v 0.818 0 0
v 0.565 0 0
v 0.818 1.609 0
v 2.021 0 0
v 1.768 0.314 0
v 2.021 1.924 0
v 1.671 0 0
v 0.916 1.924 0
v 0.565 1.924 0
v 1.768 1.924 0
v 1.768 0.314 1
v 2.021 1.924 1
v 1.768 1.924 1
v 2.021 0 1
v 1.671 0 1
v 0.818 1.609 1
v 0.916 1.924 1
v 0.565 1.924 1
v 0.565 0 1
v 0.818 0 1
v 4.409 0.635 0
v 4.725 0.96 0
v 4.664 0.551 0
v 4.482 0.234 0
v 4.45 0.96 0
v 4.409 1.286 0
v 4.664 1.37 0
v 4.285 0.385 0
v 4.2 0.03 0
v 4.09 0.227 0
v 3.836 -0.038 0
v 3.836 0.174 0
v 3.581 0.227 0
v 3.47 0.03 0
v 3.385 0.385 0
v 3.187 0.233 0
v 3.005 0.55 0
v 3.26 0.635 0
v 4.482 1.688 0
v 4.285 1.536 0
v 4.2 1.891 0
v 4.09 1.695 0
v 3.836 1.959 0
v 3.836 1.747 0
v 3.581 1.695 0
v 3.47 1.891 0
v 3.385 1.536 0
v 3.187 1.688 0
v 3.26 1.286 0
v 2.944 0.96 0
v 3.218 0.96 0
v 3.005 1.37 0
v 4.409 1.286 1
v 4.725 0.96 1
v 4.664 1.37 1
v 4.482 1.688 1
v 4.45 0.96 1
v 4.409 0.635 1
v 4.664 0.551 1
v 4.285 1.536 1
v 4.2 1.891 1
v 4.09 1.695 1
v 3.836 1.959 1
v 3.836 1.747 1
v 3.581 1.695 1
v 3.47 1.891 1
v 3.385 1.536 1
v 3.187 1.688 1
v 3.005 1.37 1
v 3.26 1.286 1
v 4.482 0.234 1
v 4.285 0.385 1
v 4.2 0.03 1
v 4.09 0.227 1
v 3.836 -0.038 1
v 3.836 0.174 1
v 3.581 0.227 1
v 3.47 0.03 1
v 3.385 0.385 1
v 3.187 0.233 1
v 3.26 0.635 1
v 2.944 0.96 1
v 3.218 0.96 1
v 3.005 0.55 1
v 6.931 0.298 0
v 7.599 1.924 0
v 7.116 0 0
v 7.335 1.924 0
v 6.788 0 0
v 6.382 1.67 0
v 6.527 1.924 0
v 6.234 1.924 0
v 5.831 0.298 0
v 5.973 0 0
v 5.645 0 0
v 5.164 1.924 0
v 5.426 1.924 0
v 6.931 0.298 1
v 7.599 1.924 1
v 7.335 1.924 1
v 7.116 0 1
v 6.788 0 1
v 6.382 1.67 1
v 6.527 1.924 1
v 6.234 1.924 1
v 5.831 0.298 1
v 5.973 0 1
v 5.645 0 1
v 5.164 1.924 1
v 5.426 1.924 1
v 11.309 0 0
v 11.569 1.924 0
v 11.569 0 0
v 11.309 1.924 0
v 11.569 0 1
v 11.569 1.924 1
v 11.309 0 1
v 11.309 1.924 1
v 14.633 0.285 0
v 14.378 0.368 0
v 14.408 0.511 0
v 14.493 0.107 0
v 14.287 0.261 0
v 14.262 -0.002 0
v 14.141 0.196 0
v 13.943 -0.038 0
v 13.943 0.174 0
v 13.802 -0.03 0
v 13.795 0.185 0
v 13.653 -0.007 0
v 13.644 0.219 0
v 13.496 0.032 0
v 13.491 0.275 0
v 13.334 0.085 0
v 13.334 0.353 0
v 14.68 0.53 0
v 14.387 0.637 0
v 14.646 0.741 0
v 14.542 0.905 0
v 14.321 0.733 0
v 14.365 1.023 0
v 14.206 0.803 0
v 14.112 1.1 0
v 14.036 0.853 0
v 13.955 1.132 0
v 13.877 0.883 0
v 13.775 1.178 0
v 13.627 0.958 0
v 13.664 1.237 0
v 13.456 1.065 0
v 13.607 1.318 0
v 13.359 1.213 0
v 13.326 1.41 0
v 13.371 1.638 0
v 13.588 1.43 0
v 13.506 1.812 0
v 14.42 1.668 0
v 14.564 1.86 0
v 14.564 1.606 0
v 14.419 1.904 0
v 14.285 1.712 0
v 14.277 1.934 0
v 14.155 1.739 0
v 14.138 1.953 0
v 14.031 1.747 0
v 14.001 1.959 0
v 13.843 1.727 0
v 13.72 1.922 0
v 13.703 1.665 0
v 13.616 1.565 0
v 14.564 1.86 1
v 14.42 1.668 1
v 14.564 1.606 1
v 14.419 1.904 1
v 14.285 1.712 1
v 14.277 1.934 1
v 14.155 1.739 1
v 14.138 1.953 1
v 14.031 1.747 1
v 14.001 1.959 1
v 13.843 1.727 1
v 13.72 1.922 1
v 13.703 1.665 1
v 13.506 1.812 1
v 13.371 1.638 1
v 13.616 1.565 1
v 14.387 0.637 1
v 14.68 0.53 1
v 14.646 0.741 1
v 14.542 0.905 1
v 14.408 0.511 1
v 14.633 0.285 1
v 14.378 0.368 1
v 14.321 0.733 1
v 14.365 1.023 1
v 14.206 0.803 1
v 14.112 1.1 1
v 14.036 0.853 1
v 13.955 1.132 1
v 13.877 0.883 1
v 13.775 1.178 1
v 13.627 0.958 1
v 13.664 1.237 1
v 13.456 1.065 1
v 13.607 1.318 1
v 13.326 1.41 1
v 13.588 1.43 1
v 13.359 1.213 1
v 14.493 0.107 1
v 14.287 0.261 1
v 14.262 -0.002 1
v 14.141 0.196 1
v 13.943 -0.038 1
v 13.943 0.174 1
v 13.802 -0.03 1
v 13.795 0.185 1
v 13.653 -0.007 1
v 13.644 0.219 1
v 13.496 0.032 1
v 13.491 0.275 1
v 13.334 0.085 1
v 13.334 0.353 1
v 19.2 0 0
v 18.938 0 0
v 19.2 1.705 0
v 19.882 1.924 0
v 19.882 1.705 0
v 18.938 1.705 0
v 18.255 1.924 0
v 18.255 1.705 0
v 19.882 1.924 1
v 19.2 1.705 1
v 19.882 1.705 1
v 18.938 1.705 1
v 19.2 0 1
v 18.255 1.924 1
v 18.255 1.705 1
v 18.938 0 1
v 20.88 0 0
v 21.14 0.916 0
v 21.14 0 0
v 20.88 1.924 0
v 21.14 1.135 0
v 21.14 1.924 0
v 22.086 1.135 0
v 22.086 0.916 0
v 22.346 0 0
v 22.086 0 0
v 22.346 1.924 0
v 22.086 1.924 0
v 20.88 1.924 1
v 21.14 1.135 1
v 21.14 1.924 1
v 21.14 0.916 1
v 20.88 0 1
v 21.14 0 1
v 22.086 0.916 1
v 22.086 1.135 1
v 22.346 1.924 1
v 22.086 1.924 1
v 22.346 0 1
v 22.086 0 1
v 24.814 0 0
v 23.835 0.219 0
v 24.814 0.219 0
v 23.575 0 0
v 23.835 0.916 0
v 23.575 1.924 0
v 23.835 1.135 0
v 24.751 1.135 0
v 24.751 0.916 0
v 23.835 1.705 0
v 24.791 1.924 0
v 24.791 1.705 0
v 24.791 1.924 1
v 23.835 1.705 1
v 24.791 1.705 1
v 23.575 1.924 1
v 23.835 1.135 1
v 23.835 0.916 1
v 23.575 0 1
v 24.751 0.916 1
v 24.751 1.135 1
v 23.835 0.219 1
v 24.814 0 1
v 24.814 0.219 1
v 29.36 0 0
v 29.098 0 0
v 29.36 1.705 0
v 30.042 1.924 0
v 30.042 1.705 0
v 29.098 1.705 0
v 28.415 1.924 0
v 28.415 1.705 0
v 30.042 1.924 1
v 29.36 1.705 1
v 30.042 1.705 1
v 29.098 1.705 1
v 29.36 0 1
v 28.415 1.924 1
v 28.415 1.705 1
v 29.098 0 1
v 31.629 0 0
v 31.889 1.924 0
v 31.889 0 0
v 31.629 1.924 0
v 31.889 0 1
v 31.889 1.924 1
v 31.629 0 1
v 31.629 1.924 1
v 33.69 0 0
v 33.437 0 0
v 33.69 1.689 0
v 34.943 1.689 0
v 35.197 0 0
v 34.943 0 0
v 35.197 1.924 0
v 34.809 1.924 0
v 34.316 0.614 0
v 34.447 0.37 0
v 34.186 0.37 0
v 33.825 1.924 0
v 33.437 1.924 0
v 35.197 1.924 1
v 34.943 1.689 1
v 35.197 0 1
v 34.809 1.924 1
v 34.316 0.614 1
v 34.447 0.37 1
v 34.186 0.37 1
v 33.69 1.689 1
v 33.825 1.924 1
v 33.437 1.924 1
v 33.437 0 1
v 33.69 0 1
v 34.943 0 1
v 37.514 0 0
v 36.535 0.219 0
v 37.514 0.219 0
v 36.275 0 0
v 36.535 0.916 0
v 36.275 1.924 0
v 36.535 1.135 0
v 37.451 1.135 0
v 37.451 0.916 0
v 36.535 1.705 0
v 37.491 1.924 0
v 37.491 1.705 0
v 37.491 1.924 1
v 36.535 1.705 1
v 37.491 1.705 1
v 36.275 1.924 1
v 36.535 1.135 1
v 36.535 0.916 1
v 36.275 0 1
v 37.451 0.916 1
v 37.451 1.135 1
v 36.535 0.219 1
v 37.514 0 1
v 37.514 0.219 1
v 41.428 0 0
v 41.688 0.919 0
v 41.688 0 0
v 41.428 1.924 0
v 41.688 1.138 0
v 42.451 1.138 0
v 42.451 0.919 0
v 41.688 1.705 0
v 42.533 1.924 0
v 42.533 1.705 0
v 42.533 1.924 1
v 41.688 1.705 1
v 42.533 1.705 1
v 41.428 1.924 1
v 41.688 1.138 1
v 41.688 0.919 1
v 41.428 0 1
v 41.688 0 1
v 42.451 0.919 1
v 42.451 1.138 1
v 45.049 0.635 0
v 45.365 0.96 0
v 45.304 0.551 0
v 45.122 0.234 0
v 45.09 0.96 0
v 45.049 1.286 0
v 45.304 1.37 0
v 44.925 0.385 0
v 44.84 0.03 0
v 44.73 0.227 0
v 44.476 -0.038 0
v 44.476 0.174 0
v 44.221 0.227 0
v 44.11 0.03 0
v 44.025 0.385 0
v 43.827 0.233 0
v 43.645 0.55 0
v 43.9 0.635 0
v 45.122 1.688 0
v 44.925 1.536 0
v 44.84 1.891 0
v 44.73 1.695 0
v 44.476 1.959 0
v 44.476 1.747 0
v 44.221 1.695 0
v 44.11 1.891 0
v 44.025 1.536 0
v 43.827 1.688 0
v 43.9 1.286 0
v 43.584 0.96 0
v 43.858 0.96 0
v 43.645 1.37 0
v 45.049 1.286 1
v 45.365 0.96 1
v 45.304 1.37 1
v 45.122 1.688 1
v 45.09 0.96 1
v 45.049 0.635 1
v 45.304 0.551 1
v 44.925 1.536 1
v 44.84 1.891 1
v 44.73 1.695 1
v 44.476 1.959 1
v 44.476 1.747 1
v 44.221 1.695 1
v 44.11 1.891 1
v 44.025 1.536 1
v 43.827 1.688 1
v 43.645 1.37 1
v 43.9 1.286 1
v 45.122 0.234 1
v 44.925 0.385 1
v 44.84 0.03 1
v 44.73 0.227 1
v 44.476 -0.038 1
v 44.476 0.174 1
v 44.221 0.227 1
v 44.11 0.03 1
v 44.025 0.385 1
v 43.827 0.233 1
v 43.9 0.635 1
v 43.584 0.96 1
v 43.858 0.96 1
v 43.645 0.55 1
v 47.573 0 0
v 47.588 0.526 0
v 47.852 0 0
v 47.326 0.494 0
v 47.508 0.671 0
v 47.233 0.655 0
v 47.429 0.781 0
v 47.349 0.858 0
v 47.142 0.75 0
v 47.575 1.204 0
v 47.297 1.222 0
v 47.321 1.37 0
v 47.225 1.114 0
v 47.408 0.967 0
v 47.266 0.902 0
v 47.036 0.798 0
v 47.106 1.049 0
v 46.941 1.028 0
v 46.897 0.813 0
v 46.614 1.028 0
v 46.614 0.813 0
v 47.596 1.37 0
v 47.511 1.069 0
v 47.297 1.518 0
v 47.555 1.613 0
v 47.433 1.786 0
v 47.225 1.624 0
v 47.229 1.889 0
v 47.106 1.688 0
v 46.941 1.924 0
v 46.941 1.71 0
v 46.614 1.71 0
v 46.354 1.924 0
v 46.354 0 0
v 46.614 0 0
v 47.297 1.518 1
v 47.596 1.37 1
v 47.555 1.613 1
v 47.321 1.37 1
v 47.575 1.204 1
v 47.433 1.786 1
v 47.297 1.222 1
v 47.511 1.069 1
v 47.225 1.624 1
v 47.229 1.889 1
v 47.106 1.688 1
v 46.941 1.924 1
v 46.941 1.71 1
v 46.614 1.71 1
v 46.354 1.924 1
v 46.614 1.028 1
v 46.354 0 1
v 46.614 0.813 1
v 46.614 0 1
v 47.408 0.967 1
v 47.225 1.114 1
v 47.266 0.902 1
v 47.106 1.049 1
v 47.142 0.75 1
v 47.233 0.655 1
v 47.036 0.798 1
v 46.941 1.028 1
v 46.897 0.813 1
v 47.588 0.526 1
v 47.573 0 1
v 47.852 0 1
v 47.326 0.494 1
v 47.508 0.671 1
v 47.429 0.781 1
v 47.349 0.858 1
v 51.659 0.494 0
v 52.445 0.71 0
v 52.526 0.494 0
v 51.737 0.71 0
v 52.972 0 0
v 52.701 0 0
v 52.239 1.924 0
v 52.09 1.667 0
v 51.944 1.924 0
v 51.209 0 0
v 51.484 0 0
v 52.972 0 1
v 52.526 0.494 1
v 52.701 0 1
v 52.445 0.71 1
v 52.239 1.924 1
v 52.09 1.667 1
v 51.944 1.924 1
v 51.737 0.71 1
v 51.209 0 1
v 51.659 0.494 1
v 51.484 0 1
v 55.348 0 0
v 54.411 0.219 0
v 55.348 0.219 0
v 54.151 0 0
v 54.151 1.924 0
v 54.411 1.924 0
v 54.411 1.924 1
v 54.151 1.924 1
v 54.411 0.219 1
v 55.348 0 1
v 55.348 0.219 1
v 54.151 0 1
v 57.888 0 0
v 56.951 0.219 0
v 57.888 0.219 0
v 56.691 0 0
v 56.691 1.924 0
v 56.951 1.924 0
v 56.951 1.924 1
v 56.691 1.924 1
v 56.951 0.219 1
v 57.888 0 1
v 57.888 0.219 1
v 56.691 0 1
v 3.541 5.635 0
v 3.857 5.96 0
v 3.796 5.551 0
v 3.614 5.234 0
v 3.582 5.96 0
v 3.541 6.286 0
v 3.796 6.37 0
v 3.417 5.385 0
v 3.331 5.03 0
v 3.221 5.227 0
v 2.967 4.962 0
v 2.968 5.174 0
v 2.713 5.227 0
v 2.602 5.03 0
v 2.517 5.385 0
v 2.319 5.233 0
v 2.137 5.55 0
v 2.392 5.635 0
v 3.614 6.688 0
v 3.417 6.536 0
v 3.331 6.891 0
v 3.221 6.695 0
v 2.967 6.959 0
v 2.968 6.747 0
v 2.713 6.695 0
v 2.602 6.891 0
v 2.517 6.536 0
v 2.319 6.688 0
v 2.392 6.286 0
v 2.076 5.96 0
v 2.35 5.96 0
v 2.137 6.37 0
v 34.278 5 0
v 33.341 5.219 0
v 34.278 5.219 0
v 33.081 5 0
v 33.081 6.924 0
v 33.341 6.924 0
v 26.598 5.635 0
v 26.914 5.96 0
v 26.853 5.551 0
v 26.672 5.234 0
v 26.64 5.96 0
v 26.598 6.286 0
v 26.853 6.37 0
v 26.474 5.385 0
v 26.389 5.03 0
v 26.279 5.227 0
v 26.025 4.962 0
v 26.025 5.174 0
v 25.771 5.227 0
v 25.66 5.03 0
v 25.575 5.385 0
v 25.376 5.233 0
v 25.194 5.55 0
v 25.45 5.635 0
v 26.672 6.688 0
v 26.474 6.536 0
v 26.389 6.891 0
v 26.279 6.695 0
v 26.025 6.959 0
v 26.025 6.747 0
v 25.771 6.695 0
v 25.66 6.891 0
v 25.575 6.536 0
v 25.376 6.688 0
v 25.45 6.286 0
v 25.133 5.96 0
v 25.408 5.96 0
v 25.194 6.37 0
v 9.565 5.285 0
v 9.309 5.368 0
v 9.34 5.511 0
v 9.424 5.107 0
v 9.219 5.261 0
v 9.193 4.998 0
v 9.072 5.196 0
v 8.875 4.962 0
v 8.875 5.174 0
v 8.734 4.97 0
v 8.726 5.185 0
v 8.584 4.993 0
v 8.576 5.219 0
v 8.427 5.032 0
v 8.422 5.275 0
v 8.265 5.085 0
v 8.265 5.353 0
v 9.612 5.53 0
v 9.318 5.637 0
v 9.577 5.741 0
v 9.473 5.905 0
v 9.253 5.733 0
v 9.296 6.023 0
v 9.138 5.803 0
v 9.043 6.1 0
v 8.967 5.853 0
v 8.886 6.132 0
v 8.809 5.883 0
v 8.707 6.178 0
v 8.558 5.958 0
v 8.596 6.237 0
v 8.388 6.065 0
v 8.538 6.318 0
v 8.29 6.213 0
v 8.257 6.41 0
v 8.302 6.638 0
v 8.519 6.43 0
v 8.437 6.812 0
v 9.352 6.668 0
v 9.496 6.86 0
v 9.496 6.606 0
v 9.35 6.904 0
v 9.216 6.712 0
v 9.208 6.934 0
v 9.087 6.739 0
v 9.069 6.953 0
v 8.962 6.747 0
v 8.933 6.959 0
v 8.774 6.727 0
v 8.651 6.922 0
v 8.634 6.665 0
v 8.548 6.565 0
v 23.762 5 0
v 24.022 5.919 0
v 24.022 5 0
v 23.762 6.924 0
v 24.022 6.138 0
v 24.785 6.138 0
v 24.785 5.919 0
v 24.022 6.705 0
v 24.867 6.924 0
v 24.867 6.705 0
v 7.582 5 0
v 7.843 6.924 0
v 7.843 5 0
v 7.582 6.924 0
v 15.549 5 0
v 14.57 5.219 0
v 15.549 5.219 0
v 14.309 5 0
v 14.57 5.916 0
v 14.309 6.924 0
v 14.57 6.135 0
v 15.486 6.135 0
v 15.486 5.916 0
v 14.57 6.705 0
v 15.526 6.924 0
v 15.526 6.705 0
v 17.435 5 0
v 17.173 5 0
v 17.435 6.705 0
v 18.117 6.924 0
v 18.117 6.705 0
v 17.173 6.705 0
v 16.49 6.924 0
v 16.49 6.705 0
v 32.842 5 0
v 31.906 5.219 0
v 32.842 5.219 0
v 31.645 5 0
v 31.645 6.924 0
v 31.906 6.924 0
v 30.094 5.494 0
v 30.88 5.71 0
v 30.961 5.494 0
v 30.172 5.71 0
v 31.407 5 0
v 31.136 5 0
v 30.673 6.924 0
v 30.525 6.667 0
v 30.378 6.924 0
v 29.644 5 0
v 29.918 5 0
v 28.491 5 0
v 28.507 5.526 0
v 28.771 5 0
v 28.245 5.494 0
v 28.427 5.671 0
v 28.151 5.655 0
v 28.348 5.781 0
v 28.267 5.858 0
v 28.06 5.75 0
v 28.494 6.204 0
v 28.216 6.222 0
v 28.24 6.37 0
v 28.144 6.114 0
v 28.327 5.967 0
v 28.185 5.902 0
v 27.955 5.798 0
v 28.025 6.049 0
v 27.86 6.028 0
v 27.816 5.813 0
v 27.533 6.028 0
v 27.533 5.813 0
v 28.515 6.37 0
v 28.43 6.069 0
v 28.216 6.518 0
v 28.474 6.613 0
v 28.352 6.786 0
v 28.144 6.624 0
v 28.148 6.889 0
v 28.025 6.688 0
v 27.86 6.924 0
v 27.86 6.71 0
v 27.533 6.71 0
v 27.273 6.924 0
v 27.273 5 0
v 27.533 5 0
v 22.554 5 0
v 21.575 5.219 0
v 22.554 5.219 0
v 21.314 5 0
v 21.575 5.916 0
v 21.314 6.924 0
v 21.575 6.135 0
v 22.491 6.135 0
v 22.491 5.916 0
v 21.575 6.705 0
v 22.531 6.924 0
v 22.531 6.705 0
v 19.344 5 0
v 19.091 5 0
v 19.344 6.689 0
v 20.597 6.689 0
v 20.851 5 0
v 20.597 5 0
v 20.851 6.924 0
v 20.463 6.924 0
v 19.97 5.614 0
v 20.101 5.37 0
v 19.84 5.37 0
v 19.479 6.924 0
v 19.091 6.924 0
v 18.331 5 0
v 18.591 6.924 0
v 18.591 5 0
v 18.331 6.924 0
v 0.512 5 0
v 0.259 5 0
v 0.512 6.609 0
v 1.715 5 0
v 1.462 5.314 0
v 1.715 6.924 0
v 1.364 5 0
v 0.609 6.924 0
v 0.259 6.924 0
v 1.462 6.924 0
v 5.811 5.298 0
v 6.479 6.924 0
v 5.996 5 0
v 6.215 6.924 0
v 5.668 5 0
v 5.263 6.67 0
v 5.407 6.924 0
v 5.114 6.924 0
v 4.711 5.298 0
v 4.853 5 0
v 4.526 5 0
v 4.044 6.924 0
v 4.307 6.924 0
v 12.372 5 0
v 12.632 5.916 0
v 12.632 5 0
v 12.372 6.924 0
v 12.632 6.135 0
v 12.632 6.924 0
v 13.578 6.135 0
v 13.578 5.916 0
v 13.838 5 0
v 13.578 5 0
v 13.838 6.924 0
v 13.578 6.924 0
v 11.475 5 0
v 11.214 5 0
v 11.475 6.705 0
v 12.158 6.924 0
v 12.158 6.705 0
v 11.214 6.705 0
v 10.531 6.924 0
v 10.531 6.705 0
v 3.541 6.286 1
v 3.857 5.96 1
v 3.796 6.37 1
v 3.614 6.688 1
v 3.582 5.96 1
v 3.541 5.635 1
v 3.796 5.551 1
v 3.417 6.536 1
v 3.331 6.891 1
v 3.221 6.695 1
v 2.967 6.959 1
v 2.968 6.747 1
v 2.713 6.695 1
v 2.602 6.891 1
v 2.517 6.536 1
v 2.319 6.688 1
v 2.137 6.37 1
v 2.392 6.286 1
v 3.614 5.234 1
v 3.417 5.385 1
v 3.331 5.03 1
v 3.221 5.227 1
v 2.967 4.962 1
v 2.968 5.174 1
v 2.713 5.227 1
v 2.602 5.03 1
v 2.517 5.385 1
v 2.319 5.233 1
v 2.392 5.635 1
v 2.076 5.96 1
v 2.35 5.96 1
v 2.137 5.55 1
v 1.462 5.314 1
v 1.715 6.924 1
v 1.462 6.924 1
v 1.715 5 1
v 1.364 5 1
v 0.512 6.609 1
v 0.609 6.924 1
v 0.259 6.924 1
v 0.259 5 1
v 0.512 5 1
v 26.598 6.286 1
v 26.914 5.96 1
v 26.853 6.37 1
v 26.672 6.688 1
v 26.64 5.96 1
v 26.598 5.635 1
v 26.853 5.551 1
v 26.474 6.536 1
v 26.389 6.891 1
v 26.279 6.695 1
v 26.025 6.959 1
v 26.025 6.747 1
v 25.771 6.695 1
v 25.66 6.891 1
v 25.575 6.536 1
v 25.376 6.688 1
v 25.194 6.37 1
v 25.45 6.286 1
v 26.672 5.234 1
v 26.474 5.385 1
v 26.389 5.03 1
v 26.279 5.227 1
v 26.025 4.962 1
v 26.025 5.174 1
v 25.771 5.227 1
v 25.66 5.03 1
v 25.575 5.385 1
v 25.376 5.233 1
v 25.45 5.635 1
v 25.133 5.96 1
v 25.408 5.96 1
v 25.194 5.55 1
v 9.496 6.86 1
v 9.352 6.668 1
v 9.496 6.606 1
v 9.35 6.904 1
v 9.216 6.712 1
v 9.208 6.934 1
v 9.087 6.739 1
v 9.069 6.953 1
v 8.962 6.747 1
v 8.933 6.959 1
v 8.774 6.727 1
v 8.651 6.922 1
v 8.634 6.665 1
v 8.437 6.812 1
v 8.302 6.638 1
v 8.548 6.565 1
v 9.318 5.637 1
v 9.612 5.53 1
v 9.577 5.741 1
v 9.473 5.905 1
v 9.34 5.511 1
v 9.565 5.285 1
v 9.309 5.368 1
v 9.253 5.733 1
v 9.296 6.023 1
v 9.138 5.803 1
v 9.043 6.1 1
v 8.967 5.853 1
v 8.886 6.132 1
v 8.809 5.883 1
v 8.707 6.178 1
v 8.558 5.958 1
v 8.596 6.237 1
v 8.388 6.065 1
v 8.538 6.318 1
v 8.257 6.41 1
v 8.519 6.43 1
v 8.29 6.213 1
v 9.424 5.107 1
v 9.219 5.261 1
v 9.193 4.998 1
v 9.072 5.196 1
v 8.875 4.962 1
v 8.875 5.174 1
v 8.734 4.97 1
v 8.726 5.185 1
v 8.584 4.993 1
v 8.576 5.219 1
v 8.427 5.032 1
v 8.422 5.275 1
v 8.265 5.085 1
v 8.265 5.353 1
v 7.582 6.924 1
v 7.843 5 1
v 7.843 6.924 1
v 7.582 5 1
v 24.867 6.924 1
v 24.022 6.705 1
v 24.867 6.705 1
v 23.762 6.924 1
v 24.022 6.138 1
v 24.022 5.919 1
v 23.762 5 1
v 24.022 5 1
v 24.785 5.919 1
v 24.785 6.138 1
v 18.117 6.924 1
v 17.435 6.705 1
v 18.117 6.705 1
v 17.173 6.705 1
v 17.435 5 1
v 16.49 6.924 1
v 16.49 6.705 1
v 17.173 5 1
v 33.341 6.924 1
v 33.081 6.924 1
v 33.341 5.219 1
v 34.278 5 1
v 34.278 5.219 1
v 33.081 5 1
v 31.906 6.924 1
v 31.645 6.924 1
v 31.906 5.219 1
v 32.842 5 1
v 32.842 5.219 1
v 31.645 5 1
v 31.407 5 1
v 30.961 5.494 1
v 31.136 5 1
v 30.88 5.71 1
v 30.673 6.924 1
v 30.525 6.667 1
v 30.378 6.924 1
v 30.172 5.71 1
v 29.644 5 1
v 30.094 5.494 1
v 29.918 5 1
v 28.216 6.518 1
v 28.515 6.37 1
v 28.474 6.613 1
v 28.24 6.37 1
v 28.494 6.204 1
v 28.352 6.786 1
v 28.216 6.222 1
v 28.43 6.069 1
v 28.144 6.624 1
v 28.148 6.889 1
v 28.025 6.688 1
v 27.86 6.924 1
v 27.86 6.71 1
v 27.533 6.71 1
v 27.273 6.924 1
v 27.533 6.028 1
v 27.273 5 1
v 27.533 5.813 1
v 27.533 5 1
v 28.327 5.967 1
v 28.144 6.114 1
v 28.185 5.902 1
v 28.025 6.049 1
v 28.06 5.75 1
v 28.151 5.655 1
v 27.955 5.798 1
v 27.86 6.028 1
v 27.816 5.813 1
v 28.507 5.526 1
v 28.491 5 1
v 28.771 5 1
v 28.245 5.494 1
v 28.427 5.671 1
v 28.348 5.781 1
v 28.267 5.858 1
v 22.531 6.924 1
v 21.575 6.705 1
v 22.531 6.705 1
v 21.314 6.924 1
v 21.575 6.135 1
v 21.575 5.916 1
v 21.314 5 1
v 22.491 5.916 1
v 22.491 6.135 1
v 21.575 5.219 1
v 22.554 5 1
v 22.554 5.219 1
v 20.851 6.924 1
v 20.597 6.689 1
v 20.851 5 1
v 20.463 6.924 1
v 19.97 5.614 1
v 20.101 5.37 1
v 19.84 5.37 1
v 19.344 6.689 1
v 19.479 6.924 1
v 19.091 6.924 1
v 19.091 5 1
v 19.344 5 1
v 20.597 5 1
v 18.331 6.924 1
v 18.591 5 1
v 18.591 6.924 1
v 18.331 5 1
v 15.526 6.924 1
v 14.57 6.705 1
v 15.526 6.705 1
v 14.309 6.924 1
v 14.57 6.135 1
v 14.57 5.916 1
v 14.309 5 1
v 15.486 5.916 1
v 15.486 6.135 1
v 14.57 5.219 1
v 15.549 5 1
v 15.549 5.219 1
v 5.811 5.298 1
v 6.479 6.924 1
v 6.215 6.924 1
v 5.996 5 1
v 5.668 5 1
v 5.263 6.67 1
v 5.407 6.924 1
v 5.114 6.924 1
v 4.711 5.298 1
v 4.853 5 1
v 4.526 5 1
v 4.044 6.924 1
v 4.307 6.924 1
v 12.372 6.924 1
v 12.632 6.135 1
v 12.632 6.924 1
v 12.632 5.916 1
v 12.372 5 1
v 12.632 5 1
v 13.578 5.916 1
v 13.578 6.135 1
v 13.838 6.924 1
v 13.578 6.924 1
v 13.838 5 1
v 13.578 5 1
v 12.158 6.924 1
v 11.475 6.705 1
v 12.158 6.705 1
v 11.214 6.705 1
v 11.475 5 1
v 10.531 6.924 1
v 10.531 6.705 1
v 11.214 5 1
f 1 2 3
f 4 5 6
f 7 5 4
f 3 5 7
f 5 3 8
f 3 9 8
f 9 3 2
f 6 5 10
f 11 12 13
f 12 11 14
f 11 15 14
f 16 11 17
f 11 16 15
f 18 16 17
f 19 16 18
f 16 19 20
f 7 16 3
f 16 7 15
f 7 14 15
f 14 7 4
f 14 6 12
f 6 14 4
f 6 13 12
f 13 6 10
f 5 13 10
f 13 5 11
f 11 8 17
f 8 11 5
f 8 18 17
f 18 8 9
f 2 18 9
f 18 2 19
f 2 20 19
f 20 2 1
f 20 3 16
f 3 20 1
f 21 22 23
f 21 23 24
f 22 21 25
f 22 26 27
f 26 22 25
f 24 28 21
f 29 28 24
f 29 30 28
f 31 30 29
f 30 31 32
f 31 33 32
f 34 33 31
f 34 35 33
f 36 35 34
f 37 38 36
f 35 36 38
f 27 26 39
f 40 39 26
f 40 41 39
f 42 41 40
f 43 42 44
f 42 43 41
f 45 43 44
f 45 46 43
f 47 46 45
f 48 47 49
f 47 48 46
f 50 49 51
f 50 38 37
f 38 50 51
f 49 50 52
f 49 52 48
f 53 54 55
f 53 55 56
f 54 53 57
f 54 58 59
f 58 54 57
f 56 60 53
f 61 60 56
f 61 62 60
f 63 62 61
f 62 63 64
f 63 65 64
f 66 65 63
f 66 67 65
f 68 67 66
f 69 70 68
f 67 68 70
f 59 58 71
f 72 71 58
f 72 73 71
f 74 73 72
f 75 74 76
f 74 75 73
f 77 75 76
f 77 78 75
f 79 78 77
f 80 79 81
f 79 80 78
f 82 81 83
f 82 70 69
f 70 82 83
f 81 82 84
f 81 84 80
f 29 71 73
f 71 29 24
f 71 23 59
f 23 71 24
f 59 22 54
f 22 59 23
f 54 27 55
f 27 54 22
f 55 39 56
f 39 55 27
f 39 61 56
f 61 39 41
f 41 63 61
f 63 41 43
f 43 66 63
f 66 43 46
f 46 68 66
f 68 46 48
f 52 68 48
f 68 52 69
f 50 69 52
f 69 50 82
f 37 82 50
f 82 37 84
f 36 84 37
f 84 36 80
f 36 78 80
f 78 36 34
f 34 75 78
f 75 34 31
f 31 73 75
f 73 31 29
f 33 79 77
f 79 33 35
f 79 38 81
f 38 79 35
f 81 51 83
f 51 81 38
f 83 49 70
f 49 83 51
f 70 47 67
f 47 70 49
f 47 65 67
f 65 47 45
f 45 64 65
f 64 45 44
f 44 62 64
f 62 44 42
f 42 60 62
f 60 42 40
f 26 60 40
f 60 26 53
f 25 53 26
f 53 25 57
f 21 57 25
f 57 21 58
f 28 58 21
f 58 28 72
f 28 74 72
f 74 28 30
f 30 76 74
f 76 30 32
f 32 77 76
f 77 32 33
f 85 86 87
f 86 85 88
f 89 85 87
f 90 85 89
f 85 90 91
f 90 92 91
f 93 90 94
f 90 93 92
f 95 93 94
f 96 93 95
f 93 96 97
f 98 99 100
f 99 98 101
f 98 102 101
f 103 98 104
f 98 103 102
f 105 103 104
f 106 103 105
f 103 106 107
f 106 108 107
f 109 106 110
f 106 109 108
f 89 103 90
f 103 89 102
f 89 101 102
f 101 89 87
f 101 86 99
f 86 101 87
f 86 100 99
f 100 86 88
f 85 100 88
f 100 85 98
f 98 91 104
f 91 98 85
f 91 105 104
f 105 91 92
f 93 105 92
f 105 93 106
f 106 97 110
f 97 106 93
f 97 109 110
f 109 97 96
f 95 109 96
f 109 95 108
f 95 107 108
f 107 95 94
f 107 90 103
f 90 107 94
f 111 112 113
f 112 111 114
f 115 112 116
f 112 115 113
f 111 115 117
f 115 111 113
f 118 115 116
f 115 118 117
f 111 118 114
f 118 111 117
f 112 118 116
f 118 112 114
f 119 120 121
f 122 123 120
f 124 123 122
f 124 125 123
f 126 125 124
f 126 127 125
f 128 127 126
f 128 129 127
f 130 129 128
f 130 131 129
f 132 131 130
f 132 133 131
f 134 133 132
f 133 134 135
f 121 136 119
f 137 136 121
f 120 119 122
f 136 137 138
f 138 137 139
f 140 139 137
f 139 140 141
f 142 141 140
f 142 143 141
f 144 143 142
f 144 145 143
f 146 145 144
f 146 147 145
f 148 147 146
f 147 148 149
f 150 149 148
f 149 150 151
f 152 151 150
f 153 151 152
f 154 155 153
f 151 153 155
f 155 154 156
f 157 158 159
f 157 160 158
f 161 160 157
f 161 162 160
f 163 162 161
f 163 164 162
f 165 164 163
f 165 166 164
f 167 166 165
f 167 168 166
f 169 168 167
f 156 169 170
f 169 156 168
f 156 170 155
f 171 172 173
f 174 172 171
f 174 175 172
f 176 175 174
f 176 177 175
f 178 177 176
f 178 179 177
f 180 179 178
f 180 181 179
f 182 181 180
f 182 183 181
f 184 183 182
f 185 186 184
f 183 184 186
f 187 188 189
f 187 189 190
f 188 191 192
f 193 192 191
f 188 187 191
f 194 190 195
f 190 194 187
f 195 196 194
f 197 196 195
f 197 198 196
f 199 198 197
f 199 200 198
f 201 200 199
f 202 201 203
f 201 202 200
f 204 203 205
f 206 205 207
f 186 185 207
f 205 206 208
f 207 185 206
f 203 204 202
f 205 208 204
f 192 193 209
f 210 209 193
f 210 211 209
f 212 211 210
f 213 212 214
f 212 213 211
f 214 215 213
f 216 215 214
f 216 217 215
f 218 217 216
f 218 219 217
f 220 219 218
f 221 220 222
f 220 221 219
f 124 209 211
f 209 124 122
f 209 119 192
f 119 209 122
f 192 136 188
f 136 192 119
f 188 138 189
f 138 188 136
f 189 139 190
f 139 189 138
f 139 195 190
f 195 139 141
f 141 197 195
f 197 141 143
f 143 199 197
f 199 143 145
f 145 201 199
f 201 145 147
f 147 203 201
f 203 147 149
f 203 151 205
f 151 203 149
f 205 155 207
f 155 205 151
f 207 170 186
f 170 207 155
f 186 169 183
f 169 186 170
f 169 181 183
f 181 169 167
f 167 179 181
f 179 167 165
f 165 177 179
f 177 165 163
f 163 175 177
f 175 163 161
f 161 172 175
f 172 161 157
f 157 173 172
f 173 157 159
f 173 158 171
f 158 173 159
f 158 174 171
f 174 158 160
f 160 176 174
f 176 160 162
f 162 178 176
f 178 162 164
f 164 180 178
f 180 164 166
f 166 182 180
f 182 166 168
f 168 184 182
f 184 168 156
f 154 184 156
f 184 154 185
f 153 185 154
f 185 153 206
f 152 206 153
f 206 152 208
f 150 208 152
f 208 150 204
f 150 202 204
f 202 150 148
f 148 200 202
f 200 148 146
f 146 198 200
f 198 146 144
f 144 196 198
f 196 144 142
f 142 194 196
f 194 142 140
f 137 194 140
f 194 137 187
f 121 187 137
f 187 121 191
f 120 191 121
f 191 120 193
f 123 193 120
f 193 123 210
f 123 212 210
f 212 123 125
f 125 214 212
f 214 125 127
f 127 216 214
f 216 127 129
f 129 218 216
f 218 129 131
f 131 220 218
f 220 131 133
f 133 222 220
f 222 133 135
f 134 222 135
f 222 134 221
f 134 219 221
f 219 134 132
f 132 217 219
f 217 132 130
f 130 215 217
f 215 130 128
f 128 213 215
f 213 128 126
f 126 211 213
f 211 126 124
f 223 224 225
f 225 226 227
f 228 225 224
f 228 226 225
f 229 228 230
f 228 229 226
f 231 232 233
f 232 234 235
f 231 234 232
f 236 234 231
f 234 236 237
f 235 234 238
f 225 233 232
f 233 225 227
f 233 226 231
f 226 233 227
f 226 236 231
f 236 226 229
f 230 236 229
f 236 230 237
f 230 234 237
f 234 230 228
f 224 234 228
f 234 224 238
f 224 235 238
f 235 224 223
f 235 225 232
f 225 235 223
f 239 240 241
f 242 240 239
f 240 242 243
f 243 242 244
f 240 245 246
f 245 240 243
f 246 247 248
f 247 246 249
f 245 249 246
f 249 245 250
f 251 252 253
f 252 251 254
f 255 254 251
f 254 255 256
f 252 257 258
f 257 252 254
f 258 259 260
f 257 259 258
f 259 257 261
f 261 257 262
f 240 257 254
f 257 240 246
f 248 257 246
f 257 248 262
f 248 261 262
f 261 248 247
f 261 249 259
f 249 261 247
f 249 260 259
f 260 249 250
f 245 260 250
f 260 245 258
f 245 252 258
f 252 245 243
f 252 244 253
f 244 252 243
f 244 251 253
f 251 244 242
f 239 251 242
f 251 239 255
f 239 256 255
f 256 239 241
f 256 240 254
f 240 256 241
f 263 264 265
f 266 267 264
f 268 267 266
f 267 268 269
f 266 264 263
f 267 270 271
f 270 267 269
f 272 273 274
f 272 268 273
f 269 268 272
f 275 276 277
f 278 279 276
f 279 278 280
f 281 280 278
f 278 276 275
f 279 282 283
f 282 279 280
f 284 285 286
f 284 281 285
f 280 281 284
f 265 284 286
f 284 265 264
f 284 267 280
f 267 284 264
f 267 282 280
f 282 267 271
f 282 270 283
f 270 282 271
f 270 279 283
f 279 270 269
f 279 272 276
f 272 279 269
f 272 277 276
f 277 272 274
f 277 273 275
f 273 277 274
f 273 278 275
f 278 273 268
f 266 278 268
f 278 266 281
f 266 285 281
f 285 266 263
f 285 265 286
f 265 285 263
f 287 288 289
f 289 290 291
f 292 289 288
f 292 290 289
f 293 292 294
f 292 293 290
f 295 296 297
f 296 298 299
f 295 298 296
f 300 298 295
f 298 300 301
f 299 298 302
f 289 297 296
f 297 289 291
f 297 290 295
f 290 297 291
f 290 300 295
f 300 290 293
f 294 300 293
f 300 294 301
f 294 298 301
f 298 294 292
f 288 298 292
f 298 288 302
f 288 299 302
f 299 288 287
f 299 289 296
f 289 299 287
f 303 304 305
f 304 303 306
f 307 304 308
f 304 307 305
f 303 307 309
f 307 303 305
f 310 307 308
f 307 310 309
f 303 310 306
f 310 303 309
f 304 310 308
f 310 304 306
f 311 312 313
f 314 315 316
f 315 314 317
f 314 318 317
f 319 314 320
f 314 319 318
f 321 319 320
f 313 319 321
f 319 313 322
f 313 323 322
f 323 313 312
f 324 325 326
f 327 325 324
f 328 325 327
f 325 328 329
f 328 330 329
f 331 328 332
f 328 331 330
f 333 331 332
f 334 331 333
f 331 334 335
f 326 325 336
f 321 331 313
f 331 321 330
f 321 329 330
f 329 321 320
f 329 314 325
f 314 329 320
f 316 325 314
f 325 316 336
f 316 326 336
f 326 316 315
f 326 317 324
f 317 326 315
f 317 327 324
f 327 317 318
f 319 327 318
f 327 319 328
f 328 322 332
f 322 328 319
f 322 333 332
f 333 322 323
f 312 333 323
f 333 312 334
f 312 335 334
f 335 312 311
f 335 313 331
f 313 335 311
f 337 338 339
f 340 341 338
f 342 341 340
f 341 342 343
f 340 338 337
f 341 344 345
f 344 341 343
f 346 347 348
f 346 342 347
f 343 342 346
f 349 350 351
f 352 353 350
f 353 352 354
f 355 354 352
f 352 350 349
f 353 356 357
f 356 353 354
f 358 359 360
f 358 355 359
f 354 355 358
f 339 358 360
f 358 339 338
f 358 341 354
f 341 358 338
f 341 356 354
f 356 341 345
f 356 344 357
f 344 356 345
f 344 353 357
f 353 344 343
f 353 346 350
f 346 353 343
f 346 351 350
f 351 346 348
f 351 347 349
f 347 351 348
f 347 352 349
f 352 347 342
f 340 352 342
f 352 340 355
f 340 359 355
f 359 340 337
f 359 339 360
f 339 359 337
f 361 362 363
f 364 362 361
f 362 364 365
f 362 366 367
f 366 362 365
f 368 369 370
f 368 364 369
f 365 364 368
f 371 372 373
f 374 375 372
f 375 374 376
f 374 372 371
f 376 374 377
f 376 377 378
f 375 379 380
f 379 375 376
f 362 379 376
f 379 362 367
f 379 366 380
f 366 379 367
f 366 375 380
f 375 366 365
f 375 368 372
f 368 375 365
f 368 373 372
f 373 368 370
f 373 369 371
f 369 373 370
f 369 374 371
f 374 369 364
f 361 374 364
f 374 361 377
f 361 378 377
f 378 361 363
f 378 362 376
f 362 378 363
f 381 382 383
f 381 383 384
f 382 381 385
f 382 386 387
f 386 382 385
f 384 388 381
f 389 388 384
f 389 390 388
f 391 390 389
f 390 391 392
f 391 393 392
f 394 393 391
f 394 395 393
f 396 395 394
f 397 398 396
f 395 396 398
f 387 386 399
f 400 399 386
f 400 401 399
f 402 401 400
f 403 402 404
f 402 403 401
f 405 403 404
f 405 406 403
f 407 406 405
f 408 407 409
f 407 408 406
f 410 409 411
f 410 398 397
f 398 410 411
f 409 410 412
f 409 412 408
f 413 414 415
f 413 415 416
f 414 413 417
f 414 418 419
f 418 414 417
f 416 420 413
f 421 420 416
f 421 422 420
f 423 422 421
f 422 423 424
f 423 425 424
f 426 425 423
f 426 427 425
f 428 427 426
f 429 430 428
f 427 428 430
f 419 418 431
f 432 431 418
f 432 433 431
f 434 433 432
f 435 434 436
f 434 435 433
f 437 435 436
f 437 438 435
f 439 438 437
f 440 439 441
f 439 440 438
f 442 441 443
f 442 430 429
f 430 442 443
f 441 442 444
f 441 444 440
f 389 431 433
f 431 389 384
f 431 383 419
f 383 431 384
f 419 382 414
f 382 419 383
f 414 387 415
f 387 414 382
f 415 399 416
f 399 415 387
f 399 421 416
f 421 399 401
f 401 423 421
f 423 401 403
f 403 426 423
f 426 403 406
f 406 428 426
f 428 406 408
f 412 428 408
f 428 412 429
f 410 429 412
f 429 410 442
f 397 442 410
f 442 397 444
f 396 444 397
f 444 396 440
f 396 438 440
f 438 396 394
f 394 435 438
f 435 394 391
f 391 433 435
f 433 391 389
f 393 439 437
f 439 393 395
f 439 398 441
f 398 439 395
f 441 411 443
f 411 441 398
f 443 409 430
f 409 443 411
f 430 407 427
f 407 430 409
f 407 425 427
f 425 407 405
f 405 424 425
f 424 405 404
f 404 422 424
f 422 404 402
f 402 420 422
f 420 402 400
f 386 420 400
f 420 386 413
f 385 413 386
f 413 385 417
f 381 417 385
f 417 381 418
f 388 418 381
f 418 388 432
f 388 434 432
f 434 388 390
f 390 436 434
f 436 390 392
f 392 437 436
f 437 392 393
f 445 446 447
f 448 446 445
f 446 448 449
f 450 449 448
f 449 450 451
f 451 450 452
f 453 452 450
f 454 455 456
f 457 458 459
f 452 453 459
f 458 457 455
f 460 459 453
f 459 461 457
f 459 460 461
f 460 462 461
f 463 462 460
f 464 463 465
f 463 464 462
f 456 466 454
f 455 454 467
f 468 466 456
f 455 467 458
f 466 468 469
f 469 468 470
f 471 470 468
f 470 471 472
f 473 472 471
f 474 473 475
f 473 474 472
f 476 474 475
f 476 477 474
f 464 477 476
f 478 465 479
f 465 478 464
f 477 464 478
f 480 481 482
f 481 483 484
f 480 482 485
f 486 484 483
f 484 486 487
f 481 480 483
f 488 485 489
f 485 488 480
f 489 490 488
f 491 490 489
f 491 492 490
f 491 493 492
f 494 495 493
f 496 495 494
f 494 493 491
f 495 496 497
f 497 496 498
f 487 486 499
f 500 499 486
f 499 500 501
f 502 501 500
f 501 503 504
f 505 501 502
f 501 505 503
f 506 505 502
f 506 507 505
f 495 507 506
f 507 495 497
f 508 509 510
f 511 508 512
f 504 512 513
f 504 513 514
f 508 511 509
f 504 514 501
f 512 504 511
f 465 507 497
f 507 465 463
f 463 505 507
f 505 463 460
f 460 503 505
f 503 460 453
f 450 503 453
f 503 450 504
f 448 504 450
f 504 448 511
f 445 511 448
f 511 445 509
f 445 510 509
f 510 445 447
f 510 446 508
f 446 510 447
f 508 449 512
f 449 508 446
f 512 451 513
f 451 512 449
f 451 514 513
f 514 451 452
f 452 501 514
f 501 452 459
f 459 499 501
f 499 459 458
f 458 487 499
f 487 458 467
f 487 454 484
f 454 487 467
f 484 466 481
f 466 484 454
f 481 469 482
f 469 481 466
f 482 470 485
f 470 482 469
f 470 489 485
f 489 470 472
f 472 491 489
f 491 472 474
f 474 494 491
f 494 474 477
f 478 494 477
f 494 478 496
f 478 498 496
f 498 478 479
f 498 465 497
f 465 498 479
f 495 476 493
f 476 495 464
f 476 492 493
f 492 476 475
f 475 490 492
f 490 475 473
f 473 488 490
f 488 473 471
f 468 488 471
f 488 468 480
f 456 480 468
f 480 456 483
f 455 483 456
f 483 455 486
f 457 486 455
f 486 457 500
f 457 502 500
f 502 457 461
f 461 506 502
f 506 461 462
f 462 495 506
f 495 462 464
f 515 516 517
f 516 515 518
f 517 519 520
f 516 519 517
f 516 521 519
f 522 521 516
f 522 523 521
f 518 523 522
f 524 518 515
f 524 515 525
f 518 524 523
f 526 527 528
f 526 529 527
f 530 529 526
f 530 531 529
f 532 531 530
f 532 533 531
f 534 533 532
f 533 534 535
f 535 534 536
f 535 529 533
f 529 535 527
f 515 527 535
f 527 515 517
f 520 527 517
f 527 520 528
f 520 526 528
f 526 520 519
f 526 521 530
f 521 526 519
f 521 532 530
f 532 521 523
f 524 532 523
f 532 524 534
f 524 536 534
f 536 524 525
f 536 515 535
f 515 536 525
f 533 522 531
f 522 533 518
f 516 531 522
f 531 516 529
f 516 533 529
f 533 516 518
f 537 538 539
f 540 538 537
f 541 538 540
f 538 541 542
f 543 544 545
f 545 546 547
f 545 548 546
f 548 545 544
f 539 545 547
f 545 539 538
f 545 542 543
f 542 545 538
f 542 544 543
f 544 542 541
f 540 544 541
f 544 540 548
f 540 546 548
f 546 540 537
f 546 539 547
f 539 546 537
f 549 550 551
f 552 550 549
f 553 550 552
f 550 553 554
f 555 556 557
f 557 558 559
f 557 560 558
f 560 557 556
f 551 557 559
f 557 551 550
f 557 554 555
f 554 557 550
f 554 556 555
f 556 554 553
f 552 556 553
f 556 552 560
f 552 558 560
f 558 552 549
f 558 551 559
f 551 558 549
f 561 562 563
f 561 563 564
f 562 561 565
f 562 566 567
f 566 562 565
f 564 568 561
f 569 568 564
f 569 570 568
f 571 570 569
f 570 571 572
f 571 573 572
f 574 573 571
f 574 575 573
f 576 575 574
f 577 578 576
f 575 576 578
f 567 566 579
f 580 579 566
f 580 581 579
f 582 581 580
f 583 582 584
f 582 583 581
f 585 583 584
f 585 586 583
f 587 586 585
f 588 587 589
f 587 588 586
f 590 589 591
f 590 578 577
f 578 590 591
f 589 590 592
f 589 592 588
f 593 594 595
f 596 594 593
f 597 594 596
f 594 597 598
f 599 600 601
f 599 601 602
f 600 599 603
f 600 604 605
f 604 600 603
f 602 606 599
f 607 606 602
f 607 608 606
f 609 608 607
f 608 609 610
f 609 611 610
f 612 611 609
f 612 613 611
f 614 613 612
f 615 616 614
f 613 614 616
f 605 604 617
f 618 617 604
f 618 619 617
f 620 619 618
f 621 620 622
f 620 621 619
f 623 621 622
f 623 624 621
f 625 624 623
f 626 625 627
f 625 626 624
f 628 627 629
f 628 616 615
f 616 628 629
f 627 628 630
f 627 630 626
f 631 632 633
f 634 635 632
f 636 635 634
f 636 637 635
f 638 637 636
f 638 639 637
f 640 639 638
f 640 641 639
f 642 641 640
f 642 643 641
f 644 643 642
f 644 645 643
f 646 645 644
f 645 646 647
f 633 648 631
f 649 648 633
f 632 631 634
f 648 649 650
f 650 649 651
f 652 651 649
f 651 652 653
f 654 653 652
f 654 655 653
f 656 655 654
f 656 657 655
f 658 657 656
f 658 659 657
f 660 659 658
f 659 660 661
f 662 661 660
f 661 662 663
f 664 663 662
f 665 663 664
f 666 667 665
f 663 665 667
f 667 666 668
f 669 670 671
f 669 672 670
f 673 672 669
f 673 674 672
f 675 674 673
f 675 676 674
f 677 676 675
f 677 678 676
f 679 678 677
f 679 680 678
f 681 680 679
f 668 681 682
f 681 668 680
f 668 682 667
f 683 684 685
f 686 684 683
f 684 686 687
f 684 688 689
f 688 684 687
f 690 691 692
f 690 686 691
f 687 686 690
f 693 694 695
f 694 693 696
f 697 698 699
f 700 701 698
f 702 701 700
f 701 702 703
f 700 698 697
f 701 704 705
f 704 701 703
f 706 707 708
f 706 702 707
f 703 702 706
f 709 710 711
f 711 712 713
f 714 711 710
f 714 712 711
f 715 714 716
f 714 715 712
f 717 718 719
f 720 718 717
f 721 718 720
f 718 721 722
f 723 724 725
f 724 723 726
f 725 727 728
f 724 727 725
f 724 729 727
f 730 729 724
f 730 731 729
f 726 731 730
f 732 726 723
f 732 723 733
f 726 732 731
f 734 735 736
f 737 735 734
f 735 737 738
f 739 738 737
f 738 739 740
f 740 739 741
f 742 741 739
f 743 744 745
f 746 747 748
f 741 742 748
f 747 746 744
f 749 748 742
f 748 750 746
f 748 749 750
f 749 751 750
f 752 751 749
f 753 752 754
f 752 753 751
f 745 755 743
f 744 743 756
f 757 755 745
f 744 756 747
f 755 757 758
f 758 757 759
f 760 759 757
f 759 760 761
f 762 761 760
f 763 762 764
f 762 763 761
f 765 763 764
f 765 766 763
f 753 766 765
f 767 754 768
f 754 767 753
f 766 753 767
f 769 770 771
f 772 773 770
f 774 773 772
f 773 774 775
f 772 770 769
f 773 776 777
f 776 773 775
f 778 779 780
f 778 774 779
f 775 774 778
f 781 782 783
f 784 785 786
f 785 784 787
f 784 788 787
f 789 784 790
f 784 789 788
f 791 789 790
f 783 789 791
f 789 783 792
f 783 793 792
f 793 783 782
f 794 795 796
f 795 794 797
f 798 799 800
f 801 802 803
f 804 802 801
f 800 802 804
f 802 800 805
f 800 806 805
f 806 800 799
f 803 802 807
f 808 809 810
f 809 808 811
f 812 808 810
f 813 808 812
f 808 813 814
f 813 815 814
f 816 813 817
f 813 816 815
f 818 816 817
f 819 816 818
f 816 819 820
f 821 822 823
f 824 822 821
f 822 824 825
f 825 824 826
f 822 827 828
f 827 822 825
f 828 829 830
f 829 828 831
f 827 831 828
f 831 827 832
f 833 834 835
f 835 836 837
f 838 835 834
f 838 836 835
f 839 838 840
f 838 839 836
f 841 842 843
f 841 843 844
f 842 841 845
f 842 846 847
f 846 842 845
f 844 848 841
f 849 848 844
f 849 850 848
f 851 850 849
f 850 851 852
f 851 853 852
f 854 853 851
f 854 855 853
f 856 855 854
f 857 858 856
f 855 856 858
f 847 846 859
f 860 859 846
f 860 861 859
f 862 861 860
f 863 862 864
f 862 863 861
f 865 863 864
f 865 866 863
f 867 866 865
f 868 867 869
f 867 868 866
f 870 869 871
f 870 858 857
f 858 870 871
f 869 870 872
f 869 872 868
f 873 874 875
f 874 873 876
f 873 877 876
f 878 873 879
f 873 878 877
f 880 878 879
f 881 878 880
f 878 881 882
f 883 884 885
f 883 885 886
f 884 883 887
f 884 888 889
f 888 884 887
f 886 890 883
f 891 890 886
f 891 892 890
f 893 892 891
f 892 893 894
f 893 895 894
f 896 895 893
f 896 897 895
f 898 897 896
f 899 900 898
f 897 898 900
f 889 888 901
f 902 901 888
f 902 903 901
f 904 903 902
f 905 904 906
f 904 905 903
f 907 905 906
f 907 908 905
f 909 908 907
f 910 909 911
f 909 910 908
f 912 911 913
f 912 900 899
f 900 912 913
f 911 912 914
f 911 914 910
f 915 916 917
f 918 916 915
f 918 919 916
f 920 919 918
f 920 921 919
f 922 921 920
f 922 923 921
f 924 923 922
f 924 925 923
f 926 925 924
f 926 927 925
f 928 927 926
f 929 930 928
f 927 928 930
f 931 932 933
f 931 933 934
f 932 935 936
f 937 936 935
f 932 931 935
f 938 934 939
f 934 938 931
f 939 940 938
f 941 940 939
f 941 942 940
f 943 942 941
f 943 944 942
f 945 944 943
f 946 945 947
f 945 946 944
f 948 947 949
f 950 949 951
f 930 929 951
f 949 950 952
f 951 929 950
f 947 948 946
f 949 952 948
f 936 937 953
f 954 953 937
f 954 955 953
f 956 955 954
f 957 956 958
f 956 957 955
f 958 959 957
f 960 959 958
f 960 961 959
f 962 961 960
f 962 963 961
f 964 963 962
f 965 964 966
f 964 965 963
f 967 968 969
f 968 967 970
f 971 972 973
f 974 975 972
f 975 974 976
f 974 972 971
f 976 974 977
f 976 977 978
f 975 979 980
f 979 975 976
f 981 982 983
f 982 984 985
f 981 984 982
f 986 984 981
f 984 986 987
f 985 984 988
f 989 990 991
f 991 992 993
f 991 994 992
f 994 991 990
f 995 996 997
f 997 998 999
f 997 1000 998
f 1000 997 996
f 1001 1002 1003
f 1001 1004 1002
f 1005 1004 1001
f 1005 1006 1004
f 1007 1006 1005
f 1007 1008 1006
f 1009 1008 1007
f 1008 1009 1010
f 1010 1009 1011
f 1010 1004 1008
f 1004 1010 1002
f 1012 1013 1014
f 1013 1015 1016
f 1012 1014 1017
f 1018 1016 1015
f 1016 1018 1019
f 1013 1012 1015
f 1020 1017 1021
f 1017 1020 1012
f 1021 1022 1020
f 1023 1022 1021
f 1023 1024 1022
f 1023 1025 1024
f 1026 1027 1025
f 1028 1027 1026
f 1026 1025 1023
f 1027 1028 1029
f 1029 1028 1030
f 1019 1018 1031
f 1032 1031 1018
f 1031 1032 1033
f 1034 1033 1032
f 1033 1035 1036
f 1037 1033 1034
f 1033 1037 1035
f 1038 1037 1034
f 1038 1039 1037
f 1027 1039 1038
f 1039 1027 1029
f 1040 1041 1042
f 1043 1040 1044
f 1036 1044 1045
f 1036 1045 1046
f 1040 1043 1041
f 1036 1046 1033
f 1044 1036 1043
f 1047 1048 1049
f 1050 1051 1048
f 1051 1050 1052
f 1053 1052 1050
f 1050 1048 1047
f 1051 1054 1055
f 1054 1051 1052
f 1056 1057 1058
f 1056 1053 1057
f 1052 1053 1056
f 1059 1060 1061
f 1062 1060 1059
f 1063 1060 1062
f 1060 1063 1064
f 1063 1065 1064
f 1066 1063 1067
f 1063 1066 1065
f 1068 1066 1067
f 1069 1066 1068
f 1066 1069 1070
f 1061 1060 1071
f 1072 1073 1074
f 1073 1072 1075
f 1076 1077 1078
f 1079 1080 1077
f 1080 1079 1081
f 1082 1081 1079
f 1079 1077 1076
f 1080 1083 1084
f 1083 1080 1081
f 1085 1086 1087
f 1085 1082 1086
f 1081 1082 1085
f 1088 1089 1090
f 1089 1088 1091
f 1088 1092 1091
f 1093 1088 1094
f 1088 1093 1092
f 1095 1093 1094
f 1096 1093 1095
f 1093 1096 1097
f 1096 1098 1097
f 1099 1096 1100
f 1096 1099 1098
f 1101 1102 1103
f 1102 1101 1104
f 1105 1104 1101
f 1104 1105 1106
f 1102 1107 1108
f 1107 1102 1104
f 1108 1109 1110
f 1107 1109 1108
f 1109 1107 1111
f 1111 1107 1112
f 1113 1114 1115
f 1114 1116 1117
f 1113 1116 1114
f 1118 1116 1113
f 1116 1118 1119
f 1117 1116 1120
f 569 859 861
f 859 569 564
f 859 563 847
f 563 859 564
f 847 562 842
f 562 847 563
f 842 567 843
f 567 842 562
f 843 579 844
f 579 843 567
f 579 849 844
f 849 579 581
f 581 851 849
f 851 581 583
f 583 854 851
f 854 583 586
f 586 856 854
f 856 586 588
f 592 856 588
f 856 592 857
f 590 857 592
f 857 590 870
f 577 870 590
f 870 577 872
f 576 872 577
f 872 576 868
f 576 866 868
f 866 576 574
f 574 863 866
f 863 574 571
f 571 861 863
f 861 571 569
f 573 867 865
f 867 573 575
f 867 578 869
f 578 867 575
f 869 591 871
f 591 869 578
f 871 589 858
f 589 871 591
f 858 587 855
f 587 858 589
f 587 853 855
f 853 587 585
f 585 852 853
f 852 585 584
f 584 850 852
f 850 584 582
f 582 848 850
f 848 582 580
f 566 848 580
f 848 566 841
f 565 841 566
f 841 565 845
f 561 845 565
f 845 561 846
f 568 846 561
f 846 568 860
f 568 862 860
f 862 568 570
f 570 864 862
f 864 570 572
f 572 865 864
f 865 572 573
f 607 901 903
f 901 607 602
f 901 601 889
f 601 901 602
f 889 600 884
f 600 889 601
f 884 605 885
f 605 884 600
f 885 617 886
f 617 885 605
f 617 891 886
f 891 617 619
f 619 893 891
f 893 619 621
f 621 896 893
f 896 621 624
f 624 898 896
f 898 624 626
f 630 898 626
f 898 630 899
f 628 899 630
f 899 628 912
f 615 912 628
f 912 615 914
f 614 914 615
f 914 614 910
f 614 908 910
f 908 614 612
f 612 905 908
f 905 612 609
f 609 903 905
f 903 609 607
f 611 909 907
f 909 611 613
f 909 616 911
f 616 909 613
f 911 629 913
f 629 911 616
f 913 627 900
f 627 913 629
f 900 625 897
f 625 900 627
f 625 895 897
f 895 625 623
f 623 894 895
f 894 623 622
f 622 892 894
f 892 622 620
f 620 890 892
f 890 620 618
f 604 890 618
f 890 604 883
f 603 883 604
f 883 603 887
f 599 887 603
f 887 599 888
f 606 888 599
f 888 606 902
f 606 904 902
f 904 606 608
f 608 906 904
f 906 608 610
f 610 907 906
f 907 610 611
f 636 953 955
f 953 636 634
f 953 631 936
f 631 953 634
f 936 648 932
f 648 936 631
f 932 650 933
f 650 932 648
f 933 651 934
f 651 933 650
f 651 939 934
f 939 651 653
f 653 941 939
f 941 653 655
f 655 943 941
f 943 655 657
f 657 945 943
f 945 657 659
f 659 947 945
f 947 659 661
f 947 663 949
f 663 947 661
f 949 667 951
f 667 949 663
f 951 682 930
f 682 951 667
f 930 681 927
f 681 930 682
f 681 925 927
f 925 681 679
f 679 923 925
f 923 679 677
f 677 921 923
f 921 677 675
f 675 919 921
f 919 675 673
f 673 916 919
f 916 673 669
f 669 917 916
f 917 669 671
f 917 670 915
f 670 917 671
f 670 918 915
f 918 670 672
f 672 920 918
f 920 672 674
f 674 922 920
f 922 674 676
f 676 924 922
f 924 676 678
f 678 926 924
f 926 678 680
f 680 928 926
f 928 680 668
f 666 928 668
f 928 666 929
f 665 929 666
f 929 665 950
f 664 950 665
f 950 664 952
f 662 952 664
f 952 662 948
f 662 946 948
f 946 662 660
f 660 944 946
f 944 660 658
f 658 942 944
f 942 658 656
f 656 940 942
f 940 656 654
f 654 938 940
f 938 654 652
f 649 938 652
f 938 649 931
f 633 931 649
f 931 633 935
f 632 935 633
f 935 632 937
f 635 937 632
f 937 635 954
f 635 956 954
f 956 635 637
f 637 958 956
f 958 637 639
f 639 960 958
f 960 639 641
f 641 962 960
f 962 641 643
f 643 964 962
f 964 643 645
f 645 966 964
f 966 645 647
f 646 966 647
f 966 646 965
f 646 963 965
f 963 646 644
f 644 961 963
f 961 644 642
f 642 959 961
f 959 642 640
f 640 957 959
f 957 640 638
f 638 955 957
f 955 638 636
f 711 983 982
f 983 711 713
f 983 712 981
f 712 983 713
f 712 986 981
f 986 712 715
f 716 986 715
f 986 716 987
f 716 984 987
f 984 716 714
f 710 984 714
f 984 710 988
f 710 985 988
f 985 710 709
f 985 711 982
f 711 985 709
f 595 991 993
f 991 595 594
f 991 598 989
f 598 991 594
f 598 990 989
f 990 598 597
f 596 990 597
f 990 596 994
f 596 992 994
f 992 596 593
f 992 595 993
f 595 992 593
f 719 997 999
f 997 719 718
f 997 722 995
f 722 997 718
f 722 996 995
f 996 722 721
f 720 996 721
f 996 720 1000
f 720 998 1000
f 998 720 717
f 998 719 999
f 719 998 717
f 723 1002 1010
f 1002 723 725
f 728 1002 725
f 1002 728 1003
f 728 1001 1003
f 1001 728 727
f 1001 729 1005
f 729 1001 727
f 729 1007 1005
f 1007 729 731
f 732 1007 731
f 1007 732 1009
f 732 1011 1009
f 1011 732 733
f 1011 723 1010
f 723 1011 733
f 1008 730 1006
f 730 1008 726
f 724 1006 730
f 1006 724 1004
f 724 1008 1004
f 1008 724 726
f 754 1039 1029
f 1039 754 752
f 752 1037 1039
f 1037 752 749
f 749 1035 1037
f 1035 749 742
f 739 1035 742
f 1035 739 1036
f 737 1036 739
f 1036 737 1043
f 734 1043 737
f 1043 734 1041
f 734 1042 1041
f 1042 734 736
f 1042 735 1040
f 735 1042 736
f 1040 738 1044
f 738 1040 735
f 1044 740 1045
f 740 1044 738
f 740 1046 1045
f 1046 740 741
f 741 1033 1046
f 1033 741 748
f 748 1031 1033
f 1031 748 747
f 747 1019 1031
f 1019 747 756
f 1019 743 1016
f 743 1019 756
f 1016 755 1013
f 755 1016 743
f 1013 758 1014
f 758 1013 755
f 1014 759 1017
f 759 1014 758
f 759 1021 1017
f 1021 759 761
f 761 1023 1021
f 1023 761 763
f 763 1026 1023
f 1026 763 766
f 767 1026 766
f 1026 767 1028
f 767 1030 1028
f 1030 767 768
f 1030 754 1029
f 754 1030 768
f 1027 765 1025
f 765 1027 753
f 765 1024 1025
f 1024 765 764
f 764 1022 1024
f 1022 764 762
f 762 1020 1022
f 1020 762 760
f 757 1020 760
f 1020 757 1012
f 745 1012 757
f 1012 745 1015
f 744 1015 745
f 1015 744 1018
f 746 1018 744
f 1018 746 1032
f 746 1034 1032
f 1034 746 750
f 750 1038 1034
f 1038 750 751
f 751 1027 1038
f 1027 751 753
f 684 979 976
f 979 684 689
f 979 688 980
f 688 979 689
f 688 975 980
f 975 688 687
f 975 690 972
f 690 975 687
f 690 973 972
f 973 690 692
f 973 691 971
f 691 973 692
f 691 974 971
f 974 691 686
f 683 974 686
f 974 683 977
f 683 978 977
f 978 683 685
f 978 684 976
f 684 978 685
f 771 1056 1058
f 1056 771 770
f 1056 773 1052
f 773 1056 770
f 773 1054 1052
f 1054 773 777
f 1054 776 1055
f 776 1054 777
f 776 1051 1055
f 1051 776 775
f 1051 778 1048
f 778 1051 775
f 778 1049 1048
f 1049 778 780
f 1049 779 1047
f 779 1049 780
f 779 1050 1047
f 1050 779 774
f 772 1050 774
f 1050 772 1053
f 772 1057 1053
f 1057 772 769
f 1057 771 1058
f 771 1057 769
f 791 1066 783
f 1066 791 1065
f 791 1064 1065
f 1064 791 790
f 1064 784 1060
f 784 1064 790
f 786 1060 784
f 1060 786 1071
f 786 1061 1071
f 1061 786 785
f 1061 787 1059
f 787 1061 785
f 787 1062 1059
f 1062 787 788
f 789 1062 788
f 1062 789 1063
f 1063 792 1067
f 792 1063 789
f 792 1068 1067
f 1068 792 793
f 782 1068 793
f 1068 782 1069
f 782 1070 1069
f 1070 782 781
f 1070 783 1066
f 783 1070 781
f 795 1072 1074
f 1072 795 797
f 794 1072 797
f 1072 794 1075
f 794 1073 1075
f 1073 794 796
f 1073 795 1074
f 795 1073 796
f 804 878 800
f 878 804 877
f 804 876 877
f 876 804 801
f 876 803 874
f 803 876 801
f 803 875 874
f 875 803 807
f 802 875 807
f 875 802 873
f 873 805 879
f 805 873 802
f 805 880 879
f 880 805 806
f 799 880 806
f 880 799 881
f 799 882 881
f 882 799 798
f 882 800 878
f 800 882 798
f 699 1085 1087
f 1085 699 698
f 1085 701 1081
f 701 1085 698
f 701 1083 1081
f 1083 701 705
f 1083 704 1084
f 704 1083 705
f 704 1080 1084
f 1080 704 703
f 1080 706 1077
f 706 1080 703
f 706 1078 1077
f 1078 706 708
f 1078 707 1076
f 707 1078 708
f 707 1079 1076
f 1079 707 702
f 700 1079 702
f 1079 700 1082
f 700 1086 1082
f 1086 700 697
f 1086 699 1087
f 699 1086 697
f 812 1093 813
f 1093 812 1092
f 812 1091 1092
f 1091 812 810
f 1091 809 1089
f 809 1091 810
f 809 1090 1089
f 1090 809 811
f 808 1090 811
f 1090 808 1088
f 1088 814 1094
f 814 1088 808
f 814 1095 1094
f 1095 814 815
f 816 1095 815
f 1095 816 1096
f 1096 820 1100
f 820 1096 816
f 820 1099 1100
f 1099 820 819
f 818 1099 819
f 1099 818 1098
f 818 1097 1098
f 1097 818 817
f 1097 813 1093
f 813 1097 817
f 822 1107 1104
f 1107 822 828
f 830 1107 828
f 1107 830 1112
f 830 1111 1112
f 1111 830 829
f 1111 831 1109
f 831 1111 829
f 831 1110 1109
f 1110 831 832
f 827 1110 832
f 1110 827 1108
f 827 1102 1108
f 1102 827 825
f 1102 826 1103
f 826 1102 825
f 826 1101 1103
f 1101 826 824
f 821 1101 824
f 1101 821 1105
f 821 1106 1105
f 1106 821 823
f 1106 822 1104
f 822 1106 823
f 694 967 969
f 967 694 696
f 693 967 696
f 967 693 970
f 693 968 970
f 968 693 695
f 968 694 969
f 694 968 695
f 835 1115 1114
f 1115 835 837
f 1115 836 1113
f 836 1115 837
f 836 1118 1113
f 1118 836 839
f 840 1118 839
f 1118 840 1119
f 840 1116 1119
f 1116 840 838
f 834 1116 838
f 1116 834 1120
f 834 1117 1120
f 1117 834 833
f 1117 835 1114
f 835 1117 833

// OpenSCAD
Test_String="NOW IS THE TIME FOR ALL ";

Type_Size=1.9;
Typeface_="Wingdings";

//BOTTOM LINE - 10 CPI
for (n=[0:1:len(Test_String)-1]){
    translate([2.54/2+2.54*n,0,0])
    linear_extrude(1)
    text(Test_String[n],size=Type_Size,halign="center",valign="baseline",font=Typeface_);
    }

//TOP LINE - AS TYPED
translate([0,5,0])
linear_extrude(1)
text(Test_String,size=Type_Size,halign="left",valign="baseline",font=Typeface_);
